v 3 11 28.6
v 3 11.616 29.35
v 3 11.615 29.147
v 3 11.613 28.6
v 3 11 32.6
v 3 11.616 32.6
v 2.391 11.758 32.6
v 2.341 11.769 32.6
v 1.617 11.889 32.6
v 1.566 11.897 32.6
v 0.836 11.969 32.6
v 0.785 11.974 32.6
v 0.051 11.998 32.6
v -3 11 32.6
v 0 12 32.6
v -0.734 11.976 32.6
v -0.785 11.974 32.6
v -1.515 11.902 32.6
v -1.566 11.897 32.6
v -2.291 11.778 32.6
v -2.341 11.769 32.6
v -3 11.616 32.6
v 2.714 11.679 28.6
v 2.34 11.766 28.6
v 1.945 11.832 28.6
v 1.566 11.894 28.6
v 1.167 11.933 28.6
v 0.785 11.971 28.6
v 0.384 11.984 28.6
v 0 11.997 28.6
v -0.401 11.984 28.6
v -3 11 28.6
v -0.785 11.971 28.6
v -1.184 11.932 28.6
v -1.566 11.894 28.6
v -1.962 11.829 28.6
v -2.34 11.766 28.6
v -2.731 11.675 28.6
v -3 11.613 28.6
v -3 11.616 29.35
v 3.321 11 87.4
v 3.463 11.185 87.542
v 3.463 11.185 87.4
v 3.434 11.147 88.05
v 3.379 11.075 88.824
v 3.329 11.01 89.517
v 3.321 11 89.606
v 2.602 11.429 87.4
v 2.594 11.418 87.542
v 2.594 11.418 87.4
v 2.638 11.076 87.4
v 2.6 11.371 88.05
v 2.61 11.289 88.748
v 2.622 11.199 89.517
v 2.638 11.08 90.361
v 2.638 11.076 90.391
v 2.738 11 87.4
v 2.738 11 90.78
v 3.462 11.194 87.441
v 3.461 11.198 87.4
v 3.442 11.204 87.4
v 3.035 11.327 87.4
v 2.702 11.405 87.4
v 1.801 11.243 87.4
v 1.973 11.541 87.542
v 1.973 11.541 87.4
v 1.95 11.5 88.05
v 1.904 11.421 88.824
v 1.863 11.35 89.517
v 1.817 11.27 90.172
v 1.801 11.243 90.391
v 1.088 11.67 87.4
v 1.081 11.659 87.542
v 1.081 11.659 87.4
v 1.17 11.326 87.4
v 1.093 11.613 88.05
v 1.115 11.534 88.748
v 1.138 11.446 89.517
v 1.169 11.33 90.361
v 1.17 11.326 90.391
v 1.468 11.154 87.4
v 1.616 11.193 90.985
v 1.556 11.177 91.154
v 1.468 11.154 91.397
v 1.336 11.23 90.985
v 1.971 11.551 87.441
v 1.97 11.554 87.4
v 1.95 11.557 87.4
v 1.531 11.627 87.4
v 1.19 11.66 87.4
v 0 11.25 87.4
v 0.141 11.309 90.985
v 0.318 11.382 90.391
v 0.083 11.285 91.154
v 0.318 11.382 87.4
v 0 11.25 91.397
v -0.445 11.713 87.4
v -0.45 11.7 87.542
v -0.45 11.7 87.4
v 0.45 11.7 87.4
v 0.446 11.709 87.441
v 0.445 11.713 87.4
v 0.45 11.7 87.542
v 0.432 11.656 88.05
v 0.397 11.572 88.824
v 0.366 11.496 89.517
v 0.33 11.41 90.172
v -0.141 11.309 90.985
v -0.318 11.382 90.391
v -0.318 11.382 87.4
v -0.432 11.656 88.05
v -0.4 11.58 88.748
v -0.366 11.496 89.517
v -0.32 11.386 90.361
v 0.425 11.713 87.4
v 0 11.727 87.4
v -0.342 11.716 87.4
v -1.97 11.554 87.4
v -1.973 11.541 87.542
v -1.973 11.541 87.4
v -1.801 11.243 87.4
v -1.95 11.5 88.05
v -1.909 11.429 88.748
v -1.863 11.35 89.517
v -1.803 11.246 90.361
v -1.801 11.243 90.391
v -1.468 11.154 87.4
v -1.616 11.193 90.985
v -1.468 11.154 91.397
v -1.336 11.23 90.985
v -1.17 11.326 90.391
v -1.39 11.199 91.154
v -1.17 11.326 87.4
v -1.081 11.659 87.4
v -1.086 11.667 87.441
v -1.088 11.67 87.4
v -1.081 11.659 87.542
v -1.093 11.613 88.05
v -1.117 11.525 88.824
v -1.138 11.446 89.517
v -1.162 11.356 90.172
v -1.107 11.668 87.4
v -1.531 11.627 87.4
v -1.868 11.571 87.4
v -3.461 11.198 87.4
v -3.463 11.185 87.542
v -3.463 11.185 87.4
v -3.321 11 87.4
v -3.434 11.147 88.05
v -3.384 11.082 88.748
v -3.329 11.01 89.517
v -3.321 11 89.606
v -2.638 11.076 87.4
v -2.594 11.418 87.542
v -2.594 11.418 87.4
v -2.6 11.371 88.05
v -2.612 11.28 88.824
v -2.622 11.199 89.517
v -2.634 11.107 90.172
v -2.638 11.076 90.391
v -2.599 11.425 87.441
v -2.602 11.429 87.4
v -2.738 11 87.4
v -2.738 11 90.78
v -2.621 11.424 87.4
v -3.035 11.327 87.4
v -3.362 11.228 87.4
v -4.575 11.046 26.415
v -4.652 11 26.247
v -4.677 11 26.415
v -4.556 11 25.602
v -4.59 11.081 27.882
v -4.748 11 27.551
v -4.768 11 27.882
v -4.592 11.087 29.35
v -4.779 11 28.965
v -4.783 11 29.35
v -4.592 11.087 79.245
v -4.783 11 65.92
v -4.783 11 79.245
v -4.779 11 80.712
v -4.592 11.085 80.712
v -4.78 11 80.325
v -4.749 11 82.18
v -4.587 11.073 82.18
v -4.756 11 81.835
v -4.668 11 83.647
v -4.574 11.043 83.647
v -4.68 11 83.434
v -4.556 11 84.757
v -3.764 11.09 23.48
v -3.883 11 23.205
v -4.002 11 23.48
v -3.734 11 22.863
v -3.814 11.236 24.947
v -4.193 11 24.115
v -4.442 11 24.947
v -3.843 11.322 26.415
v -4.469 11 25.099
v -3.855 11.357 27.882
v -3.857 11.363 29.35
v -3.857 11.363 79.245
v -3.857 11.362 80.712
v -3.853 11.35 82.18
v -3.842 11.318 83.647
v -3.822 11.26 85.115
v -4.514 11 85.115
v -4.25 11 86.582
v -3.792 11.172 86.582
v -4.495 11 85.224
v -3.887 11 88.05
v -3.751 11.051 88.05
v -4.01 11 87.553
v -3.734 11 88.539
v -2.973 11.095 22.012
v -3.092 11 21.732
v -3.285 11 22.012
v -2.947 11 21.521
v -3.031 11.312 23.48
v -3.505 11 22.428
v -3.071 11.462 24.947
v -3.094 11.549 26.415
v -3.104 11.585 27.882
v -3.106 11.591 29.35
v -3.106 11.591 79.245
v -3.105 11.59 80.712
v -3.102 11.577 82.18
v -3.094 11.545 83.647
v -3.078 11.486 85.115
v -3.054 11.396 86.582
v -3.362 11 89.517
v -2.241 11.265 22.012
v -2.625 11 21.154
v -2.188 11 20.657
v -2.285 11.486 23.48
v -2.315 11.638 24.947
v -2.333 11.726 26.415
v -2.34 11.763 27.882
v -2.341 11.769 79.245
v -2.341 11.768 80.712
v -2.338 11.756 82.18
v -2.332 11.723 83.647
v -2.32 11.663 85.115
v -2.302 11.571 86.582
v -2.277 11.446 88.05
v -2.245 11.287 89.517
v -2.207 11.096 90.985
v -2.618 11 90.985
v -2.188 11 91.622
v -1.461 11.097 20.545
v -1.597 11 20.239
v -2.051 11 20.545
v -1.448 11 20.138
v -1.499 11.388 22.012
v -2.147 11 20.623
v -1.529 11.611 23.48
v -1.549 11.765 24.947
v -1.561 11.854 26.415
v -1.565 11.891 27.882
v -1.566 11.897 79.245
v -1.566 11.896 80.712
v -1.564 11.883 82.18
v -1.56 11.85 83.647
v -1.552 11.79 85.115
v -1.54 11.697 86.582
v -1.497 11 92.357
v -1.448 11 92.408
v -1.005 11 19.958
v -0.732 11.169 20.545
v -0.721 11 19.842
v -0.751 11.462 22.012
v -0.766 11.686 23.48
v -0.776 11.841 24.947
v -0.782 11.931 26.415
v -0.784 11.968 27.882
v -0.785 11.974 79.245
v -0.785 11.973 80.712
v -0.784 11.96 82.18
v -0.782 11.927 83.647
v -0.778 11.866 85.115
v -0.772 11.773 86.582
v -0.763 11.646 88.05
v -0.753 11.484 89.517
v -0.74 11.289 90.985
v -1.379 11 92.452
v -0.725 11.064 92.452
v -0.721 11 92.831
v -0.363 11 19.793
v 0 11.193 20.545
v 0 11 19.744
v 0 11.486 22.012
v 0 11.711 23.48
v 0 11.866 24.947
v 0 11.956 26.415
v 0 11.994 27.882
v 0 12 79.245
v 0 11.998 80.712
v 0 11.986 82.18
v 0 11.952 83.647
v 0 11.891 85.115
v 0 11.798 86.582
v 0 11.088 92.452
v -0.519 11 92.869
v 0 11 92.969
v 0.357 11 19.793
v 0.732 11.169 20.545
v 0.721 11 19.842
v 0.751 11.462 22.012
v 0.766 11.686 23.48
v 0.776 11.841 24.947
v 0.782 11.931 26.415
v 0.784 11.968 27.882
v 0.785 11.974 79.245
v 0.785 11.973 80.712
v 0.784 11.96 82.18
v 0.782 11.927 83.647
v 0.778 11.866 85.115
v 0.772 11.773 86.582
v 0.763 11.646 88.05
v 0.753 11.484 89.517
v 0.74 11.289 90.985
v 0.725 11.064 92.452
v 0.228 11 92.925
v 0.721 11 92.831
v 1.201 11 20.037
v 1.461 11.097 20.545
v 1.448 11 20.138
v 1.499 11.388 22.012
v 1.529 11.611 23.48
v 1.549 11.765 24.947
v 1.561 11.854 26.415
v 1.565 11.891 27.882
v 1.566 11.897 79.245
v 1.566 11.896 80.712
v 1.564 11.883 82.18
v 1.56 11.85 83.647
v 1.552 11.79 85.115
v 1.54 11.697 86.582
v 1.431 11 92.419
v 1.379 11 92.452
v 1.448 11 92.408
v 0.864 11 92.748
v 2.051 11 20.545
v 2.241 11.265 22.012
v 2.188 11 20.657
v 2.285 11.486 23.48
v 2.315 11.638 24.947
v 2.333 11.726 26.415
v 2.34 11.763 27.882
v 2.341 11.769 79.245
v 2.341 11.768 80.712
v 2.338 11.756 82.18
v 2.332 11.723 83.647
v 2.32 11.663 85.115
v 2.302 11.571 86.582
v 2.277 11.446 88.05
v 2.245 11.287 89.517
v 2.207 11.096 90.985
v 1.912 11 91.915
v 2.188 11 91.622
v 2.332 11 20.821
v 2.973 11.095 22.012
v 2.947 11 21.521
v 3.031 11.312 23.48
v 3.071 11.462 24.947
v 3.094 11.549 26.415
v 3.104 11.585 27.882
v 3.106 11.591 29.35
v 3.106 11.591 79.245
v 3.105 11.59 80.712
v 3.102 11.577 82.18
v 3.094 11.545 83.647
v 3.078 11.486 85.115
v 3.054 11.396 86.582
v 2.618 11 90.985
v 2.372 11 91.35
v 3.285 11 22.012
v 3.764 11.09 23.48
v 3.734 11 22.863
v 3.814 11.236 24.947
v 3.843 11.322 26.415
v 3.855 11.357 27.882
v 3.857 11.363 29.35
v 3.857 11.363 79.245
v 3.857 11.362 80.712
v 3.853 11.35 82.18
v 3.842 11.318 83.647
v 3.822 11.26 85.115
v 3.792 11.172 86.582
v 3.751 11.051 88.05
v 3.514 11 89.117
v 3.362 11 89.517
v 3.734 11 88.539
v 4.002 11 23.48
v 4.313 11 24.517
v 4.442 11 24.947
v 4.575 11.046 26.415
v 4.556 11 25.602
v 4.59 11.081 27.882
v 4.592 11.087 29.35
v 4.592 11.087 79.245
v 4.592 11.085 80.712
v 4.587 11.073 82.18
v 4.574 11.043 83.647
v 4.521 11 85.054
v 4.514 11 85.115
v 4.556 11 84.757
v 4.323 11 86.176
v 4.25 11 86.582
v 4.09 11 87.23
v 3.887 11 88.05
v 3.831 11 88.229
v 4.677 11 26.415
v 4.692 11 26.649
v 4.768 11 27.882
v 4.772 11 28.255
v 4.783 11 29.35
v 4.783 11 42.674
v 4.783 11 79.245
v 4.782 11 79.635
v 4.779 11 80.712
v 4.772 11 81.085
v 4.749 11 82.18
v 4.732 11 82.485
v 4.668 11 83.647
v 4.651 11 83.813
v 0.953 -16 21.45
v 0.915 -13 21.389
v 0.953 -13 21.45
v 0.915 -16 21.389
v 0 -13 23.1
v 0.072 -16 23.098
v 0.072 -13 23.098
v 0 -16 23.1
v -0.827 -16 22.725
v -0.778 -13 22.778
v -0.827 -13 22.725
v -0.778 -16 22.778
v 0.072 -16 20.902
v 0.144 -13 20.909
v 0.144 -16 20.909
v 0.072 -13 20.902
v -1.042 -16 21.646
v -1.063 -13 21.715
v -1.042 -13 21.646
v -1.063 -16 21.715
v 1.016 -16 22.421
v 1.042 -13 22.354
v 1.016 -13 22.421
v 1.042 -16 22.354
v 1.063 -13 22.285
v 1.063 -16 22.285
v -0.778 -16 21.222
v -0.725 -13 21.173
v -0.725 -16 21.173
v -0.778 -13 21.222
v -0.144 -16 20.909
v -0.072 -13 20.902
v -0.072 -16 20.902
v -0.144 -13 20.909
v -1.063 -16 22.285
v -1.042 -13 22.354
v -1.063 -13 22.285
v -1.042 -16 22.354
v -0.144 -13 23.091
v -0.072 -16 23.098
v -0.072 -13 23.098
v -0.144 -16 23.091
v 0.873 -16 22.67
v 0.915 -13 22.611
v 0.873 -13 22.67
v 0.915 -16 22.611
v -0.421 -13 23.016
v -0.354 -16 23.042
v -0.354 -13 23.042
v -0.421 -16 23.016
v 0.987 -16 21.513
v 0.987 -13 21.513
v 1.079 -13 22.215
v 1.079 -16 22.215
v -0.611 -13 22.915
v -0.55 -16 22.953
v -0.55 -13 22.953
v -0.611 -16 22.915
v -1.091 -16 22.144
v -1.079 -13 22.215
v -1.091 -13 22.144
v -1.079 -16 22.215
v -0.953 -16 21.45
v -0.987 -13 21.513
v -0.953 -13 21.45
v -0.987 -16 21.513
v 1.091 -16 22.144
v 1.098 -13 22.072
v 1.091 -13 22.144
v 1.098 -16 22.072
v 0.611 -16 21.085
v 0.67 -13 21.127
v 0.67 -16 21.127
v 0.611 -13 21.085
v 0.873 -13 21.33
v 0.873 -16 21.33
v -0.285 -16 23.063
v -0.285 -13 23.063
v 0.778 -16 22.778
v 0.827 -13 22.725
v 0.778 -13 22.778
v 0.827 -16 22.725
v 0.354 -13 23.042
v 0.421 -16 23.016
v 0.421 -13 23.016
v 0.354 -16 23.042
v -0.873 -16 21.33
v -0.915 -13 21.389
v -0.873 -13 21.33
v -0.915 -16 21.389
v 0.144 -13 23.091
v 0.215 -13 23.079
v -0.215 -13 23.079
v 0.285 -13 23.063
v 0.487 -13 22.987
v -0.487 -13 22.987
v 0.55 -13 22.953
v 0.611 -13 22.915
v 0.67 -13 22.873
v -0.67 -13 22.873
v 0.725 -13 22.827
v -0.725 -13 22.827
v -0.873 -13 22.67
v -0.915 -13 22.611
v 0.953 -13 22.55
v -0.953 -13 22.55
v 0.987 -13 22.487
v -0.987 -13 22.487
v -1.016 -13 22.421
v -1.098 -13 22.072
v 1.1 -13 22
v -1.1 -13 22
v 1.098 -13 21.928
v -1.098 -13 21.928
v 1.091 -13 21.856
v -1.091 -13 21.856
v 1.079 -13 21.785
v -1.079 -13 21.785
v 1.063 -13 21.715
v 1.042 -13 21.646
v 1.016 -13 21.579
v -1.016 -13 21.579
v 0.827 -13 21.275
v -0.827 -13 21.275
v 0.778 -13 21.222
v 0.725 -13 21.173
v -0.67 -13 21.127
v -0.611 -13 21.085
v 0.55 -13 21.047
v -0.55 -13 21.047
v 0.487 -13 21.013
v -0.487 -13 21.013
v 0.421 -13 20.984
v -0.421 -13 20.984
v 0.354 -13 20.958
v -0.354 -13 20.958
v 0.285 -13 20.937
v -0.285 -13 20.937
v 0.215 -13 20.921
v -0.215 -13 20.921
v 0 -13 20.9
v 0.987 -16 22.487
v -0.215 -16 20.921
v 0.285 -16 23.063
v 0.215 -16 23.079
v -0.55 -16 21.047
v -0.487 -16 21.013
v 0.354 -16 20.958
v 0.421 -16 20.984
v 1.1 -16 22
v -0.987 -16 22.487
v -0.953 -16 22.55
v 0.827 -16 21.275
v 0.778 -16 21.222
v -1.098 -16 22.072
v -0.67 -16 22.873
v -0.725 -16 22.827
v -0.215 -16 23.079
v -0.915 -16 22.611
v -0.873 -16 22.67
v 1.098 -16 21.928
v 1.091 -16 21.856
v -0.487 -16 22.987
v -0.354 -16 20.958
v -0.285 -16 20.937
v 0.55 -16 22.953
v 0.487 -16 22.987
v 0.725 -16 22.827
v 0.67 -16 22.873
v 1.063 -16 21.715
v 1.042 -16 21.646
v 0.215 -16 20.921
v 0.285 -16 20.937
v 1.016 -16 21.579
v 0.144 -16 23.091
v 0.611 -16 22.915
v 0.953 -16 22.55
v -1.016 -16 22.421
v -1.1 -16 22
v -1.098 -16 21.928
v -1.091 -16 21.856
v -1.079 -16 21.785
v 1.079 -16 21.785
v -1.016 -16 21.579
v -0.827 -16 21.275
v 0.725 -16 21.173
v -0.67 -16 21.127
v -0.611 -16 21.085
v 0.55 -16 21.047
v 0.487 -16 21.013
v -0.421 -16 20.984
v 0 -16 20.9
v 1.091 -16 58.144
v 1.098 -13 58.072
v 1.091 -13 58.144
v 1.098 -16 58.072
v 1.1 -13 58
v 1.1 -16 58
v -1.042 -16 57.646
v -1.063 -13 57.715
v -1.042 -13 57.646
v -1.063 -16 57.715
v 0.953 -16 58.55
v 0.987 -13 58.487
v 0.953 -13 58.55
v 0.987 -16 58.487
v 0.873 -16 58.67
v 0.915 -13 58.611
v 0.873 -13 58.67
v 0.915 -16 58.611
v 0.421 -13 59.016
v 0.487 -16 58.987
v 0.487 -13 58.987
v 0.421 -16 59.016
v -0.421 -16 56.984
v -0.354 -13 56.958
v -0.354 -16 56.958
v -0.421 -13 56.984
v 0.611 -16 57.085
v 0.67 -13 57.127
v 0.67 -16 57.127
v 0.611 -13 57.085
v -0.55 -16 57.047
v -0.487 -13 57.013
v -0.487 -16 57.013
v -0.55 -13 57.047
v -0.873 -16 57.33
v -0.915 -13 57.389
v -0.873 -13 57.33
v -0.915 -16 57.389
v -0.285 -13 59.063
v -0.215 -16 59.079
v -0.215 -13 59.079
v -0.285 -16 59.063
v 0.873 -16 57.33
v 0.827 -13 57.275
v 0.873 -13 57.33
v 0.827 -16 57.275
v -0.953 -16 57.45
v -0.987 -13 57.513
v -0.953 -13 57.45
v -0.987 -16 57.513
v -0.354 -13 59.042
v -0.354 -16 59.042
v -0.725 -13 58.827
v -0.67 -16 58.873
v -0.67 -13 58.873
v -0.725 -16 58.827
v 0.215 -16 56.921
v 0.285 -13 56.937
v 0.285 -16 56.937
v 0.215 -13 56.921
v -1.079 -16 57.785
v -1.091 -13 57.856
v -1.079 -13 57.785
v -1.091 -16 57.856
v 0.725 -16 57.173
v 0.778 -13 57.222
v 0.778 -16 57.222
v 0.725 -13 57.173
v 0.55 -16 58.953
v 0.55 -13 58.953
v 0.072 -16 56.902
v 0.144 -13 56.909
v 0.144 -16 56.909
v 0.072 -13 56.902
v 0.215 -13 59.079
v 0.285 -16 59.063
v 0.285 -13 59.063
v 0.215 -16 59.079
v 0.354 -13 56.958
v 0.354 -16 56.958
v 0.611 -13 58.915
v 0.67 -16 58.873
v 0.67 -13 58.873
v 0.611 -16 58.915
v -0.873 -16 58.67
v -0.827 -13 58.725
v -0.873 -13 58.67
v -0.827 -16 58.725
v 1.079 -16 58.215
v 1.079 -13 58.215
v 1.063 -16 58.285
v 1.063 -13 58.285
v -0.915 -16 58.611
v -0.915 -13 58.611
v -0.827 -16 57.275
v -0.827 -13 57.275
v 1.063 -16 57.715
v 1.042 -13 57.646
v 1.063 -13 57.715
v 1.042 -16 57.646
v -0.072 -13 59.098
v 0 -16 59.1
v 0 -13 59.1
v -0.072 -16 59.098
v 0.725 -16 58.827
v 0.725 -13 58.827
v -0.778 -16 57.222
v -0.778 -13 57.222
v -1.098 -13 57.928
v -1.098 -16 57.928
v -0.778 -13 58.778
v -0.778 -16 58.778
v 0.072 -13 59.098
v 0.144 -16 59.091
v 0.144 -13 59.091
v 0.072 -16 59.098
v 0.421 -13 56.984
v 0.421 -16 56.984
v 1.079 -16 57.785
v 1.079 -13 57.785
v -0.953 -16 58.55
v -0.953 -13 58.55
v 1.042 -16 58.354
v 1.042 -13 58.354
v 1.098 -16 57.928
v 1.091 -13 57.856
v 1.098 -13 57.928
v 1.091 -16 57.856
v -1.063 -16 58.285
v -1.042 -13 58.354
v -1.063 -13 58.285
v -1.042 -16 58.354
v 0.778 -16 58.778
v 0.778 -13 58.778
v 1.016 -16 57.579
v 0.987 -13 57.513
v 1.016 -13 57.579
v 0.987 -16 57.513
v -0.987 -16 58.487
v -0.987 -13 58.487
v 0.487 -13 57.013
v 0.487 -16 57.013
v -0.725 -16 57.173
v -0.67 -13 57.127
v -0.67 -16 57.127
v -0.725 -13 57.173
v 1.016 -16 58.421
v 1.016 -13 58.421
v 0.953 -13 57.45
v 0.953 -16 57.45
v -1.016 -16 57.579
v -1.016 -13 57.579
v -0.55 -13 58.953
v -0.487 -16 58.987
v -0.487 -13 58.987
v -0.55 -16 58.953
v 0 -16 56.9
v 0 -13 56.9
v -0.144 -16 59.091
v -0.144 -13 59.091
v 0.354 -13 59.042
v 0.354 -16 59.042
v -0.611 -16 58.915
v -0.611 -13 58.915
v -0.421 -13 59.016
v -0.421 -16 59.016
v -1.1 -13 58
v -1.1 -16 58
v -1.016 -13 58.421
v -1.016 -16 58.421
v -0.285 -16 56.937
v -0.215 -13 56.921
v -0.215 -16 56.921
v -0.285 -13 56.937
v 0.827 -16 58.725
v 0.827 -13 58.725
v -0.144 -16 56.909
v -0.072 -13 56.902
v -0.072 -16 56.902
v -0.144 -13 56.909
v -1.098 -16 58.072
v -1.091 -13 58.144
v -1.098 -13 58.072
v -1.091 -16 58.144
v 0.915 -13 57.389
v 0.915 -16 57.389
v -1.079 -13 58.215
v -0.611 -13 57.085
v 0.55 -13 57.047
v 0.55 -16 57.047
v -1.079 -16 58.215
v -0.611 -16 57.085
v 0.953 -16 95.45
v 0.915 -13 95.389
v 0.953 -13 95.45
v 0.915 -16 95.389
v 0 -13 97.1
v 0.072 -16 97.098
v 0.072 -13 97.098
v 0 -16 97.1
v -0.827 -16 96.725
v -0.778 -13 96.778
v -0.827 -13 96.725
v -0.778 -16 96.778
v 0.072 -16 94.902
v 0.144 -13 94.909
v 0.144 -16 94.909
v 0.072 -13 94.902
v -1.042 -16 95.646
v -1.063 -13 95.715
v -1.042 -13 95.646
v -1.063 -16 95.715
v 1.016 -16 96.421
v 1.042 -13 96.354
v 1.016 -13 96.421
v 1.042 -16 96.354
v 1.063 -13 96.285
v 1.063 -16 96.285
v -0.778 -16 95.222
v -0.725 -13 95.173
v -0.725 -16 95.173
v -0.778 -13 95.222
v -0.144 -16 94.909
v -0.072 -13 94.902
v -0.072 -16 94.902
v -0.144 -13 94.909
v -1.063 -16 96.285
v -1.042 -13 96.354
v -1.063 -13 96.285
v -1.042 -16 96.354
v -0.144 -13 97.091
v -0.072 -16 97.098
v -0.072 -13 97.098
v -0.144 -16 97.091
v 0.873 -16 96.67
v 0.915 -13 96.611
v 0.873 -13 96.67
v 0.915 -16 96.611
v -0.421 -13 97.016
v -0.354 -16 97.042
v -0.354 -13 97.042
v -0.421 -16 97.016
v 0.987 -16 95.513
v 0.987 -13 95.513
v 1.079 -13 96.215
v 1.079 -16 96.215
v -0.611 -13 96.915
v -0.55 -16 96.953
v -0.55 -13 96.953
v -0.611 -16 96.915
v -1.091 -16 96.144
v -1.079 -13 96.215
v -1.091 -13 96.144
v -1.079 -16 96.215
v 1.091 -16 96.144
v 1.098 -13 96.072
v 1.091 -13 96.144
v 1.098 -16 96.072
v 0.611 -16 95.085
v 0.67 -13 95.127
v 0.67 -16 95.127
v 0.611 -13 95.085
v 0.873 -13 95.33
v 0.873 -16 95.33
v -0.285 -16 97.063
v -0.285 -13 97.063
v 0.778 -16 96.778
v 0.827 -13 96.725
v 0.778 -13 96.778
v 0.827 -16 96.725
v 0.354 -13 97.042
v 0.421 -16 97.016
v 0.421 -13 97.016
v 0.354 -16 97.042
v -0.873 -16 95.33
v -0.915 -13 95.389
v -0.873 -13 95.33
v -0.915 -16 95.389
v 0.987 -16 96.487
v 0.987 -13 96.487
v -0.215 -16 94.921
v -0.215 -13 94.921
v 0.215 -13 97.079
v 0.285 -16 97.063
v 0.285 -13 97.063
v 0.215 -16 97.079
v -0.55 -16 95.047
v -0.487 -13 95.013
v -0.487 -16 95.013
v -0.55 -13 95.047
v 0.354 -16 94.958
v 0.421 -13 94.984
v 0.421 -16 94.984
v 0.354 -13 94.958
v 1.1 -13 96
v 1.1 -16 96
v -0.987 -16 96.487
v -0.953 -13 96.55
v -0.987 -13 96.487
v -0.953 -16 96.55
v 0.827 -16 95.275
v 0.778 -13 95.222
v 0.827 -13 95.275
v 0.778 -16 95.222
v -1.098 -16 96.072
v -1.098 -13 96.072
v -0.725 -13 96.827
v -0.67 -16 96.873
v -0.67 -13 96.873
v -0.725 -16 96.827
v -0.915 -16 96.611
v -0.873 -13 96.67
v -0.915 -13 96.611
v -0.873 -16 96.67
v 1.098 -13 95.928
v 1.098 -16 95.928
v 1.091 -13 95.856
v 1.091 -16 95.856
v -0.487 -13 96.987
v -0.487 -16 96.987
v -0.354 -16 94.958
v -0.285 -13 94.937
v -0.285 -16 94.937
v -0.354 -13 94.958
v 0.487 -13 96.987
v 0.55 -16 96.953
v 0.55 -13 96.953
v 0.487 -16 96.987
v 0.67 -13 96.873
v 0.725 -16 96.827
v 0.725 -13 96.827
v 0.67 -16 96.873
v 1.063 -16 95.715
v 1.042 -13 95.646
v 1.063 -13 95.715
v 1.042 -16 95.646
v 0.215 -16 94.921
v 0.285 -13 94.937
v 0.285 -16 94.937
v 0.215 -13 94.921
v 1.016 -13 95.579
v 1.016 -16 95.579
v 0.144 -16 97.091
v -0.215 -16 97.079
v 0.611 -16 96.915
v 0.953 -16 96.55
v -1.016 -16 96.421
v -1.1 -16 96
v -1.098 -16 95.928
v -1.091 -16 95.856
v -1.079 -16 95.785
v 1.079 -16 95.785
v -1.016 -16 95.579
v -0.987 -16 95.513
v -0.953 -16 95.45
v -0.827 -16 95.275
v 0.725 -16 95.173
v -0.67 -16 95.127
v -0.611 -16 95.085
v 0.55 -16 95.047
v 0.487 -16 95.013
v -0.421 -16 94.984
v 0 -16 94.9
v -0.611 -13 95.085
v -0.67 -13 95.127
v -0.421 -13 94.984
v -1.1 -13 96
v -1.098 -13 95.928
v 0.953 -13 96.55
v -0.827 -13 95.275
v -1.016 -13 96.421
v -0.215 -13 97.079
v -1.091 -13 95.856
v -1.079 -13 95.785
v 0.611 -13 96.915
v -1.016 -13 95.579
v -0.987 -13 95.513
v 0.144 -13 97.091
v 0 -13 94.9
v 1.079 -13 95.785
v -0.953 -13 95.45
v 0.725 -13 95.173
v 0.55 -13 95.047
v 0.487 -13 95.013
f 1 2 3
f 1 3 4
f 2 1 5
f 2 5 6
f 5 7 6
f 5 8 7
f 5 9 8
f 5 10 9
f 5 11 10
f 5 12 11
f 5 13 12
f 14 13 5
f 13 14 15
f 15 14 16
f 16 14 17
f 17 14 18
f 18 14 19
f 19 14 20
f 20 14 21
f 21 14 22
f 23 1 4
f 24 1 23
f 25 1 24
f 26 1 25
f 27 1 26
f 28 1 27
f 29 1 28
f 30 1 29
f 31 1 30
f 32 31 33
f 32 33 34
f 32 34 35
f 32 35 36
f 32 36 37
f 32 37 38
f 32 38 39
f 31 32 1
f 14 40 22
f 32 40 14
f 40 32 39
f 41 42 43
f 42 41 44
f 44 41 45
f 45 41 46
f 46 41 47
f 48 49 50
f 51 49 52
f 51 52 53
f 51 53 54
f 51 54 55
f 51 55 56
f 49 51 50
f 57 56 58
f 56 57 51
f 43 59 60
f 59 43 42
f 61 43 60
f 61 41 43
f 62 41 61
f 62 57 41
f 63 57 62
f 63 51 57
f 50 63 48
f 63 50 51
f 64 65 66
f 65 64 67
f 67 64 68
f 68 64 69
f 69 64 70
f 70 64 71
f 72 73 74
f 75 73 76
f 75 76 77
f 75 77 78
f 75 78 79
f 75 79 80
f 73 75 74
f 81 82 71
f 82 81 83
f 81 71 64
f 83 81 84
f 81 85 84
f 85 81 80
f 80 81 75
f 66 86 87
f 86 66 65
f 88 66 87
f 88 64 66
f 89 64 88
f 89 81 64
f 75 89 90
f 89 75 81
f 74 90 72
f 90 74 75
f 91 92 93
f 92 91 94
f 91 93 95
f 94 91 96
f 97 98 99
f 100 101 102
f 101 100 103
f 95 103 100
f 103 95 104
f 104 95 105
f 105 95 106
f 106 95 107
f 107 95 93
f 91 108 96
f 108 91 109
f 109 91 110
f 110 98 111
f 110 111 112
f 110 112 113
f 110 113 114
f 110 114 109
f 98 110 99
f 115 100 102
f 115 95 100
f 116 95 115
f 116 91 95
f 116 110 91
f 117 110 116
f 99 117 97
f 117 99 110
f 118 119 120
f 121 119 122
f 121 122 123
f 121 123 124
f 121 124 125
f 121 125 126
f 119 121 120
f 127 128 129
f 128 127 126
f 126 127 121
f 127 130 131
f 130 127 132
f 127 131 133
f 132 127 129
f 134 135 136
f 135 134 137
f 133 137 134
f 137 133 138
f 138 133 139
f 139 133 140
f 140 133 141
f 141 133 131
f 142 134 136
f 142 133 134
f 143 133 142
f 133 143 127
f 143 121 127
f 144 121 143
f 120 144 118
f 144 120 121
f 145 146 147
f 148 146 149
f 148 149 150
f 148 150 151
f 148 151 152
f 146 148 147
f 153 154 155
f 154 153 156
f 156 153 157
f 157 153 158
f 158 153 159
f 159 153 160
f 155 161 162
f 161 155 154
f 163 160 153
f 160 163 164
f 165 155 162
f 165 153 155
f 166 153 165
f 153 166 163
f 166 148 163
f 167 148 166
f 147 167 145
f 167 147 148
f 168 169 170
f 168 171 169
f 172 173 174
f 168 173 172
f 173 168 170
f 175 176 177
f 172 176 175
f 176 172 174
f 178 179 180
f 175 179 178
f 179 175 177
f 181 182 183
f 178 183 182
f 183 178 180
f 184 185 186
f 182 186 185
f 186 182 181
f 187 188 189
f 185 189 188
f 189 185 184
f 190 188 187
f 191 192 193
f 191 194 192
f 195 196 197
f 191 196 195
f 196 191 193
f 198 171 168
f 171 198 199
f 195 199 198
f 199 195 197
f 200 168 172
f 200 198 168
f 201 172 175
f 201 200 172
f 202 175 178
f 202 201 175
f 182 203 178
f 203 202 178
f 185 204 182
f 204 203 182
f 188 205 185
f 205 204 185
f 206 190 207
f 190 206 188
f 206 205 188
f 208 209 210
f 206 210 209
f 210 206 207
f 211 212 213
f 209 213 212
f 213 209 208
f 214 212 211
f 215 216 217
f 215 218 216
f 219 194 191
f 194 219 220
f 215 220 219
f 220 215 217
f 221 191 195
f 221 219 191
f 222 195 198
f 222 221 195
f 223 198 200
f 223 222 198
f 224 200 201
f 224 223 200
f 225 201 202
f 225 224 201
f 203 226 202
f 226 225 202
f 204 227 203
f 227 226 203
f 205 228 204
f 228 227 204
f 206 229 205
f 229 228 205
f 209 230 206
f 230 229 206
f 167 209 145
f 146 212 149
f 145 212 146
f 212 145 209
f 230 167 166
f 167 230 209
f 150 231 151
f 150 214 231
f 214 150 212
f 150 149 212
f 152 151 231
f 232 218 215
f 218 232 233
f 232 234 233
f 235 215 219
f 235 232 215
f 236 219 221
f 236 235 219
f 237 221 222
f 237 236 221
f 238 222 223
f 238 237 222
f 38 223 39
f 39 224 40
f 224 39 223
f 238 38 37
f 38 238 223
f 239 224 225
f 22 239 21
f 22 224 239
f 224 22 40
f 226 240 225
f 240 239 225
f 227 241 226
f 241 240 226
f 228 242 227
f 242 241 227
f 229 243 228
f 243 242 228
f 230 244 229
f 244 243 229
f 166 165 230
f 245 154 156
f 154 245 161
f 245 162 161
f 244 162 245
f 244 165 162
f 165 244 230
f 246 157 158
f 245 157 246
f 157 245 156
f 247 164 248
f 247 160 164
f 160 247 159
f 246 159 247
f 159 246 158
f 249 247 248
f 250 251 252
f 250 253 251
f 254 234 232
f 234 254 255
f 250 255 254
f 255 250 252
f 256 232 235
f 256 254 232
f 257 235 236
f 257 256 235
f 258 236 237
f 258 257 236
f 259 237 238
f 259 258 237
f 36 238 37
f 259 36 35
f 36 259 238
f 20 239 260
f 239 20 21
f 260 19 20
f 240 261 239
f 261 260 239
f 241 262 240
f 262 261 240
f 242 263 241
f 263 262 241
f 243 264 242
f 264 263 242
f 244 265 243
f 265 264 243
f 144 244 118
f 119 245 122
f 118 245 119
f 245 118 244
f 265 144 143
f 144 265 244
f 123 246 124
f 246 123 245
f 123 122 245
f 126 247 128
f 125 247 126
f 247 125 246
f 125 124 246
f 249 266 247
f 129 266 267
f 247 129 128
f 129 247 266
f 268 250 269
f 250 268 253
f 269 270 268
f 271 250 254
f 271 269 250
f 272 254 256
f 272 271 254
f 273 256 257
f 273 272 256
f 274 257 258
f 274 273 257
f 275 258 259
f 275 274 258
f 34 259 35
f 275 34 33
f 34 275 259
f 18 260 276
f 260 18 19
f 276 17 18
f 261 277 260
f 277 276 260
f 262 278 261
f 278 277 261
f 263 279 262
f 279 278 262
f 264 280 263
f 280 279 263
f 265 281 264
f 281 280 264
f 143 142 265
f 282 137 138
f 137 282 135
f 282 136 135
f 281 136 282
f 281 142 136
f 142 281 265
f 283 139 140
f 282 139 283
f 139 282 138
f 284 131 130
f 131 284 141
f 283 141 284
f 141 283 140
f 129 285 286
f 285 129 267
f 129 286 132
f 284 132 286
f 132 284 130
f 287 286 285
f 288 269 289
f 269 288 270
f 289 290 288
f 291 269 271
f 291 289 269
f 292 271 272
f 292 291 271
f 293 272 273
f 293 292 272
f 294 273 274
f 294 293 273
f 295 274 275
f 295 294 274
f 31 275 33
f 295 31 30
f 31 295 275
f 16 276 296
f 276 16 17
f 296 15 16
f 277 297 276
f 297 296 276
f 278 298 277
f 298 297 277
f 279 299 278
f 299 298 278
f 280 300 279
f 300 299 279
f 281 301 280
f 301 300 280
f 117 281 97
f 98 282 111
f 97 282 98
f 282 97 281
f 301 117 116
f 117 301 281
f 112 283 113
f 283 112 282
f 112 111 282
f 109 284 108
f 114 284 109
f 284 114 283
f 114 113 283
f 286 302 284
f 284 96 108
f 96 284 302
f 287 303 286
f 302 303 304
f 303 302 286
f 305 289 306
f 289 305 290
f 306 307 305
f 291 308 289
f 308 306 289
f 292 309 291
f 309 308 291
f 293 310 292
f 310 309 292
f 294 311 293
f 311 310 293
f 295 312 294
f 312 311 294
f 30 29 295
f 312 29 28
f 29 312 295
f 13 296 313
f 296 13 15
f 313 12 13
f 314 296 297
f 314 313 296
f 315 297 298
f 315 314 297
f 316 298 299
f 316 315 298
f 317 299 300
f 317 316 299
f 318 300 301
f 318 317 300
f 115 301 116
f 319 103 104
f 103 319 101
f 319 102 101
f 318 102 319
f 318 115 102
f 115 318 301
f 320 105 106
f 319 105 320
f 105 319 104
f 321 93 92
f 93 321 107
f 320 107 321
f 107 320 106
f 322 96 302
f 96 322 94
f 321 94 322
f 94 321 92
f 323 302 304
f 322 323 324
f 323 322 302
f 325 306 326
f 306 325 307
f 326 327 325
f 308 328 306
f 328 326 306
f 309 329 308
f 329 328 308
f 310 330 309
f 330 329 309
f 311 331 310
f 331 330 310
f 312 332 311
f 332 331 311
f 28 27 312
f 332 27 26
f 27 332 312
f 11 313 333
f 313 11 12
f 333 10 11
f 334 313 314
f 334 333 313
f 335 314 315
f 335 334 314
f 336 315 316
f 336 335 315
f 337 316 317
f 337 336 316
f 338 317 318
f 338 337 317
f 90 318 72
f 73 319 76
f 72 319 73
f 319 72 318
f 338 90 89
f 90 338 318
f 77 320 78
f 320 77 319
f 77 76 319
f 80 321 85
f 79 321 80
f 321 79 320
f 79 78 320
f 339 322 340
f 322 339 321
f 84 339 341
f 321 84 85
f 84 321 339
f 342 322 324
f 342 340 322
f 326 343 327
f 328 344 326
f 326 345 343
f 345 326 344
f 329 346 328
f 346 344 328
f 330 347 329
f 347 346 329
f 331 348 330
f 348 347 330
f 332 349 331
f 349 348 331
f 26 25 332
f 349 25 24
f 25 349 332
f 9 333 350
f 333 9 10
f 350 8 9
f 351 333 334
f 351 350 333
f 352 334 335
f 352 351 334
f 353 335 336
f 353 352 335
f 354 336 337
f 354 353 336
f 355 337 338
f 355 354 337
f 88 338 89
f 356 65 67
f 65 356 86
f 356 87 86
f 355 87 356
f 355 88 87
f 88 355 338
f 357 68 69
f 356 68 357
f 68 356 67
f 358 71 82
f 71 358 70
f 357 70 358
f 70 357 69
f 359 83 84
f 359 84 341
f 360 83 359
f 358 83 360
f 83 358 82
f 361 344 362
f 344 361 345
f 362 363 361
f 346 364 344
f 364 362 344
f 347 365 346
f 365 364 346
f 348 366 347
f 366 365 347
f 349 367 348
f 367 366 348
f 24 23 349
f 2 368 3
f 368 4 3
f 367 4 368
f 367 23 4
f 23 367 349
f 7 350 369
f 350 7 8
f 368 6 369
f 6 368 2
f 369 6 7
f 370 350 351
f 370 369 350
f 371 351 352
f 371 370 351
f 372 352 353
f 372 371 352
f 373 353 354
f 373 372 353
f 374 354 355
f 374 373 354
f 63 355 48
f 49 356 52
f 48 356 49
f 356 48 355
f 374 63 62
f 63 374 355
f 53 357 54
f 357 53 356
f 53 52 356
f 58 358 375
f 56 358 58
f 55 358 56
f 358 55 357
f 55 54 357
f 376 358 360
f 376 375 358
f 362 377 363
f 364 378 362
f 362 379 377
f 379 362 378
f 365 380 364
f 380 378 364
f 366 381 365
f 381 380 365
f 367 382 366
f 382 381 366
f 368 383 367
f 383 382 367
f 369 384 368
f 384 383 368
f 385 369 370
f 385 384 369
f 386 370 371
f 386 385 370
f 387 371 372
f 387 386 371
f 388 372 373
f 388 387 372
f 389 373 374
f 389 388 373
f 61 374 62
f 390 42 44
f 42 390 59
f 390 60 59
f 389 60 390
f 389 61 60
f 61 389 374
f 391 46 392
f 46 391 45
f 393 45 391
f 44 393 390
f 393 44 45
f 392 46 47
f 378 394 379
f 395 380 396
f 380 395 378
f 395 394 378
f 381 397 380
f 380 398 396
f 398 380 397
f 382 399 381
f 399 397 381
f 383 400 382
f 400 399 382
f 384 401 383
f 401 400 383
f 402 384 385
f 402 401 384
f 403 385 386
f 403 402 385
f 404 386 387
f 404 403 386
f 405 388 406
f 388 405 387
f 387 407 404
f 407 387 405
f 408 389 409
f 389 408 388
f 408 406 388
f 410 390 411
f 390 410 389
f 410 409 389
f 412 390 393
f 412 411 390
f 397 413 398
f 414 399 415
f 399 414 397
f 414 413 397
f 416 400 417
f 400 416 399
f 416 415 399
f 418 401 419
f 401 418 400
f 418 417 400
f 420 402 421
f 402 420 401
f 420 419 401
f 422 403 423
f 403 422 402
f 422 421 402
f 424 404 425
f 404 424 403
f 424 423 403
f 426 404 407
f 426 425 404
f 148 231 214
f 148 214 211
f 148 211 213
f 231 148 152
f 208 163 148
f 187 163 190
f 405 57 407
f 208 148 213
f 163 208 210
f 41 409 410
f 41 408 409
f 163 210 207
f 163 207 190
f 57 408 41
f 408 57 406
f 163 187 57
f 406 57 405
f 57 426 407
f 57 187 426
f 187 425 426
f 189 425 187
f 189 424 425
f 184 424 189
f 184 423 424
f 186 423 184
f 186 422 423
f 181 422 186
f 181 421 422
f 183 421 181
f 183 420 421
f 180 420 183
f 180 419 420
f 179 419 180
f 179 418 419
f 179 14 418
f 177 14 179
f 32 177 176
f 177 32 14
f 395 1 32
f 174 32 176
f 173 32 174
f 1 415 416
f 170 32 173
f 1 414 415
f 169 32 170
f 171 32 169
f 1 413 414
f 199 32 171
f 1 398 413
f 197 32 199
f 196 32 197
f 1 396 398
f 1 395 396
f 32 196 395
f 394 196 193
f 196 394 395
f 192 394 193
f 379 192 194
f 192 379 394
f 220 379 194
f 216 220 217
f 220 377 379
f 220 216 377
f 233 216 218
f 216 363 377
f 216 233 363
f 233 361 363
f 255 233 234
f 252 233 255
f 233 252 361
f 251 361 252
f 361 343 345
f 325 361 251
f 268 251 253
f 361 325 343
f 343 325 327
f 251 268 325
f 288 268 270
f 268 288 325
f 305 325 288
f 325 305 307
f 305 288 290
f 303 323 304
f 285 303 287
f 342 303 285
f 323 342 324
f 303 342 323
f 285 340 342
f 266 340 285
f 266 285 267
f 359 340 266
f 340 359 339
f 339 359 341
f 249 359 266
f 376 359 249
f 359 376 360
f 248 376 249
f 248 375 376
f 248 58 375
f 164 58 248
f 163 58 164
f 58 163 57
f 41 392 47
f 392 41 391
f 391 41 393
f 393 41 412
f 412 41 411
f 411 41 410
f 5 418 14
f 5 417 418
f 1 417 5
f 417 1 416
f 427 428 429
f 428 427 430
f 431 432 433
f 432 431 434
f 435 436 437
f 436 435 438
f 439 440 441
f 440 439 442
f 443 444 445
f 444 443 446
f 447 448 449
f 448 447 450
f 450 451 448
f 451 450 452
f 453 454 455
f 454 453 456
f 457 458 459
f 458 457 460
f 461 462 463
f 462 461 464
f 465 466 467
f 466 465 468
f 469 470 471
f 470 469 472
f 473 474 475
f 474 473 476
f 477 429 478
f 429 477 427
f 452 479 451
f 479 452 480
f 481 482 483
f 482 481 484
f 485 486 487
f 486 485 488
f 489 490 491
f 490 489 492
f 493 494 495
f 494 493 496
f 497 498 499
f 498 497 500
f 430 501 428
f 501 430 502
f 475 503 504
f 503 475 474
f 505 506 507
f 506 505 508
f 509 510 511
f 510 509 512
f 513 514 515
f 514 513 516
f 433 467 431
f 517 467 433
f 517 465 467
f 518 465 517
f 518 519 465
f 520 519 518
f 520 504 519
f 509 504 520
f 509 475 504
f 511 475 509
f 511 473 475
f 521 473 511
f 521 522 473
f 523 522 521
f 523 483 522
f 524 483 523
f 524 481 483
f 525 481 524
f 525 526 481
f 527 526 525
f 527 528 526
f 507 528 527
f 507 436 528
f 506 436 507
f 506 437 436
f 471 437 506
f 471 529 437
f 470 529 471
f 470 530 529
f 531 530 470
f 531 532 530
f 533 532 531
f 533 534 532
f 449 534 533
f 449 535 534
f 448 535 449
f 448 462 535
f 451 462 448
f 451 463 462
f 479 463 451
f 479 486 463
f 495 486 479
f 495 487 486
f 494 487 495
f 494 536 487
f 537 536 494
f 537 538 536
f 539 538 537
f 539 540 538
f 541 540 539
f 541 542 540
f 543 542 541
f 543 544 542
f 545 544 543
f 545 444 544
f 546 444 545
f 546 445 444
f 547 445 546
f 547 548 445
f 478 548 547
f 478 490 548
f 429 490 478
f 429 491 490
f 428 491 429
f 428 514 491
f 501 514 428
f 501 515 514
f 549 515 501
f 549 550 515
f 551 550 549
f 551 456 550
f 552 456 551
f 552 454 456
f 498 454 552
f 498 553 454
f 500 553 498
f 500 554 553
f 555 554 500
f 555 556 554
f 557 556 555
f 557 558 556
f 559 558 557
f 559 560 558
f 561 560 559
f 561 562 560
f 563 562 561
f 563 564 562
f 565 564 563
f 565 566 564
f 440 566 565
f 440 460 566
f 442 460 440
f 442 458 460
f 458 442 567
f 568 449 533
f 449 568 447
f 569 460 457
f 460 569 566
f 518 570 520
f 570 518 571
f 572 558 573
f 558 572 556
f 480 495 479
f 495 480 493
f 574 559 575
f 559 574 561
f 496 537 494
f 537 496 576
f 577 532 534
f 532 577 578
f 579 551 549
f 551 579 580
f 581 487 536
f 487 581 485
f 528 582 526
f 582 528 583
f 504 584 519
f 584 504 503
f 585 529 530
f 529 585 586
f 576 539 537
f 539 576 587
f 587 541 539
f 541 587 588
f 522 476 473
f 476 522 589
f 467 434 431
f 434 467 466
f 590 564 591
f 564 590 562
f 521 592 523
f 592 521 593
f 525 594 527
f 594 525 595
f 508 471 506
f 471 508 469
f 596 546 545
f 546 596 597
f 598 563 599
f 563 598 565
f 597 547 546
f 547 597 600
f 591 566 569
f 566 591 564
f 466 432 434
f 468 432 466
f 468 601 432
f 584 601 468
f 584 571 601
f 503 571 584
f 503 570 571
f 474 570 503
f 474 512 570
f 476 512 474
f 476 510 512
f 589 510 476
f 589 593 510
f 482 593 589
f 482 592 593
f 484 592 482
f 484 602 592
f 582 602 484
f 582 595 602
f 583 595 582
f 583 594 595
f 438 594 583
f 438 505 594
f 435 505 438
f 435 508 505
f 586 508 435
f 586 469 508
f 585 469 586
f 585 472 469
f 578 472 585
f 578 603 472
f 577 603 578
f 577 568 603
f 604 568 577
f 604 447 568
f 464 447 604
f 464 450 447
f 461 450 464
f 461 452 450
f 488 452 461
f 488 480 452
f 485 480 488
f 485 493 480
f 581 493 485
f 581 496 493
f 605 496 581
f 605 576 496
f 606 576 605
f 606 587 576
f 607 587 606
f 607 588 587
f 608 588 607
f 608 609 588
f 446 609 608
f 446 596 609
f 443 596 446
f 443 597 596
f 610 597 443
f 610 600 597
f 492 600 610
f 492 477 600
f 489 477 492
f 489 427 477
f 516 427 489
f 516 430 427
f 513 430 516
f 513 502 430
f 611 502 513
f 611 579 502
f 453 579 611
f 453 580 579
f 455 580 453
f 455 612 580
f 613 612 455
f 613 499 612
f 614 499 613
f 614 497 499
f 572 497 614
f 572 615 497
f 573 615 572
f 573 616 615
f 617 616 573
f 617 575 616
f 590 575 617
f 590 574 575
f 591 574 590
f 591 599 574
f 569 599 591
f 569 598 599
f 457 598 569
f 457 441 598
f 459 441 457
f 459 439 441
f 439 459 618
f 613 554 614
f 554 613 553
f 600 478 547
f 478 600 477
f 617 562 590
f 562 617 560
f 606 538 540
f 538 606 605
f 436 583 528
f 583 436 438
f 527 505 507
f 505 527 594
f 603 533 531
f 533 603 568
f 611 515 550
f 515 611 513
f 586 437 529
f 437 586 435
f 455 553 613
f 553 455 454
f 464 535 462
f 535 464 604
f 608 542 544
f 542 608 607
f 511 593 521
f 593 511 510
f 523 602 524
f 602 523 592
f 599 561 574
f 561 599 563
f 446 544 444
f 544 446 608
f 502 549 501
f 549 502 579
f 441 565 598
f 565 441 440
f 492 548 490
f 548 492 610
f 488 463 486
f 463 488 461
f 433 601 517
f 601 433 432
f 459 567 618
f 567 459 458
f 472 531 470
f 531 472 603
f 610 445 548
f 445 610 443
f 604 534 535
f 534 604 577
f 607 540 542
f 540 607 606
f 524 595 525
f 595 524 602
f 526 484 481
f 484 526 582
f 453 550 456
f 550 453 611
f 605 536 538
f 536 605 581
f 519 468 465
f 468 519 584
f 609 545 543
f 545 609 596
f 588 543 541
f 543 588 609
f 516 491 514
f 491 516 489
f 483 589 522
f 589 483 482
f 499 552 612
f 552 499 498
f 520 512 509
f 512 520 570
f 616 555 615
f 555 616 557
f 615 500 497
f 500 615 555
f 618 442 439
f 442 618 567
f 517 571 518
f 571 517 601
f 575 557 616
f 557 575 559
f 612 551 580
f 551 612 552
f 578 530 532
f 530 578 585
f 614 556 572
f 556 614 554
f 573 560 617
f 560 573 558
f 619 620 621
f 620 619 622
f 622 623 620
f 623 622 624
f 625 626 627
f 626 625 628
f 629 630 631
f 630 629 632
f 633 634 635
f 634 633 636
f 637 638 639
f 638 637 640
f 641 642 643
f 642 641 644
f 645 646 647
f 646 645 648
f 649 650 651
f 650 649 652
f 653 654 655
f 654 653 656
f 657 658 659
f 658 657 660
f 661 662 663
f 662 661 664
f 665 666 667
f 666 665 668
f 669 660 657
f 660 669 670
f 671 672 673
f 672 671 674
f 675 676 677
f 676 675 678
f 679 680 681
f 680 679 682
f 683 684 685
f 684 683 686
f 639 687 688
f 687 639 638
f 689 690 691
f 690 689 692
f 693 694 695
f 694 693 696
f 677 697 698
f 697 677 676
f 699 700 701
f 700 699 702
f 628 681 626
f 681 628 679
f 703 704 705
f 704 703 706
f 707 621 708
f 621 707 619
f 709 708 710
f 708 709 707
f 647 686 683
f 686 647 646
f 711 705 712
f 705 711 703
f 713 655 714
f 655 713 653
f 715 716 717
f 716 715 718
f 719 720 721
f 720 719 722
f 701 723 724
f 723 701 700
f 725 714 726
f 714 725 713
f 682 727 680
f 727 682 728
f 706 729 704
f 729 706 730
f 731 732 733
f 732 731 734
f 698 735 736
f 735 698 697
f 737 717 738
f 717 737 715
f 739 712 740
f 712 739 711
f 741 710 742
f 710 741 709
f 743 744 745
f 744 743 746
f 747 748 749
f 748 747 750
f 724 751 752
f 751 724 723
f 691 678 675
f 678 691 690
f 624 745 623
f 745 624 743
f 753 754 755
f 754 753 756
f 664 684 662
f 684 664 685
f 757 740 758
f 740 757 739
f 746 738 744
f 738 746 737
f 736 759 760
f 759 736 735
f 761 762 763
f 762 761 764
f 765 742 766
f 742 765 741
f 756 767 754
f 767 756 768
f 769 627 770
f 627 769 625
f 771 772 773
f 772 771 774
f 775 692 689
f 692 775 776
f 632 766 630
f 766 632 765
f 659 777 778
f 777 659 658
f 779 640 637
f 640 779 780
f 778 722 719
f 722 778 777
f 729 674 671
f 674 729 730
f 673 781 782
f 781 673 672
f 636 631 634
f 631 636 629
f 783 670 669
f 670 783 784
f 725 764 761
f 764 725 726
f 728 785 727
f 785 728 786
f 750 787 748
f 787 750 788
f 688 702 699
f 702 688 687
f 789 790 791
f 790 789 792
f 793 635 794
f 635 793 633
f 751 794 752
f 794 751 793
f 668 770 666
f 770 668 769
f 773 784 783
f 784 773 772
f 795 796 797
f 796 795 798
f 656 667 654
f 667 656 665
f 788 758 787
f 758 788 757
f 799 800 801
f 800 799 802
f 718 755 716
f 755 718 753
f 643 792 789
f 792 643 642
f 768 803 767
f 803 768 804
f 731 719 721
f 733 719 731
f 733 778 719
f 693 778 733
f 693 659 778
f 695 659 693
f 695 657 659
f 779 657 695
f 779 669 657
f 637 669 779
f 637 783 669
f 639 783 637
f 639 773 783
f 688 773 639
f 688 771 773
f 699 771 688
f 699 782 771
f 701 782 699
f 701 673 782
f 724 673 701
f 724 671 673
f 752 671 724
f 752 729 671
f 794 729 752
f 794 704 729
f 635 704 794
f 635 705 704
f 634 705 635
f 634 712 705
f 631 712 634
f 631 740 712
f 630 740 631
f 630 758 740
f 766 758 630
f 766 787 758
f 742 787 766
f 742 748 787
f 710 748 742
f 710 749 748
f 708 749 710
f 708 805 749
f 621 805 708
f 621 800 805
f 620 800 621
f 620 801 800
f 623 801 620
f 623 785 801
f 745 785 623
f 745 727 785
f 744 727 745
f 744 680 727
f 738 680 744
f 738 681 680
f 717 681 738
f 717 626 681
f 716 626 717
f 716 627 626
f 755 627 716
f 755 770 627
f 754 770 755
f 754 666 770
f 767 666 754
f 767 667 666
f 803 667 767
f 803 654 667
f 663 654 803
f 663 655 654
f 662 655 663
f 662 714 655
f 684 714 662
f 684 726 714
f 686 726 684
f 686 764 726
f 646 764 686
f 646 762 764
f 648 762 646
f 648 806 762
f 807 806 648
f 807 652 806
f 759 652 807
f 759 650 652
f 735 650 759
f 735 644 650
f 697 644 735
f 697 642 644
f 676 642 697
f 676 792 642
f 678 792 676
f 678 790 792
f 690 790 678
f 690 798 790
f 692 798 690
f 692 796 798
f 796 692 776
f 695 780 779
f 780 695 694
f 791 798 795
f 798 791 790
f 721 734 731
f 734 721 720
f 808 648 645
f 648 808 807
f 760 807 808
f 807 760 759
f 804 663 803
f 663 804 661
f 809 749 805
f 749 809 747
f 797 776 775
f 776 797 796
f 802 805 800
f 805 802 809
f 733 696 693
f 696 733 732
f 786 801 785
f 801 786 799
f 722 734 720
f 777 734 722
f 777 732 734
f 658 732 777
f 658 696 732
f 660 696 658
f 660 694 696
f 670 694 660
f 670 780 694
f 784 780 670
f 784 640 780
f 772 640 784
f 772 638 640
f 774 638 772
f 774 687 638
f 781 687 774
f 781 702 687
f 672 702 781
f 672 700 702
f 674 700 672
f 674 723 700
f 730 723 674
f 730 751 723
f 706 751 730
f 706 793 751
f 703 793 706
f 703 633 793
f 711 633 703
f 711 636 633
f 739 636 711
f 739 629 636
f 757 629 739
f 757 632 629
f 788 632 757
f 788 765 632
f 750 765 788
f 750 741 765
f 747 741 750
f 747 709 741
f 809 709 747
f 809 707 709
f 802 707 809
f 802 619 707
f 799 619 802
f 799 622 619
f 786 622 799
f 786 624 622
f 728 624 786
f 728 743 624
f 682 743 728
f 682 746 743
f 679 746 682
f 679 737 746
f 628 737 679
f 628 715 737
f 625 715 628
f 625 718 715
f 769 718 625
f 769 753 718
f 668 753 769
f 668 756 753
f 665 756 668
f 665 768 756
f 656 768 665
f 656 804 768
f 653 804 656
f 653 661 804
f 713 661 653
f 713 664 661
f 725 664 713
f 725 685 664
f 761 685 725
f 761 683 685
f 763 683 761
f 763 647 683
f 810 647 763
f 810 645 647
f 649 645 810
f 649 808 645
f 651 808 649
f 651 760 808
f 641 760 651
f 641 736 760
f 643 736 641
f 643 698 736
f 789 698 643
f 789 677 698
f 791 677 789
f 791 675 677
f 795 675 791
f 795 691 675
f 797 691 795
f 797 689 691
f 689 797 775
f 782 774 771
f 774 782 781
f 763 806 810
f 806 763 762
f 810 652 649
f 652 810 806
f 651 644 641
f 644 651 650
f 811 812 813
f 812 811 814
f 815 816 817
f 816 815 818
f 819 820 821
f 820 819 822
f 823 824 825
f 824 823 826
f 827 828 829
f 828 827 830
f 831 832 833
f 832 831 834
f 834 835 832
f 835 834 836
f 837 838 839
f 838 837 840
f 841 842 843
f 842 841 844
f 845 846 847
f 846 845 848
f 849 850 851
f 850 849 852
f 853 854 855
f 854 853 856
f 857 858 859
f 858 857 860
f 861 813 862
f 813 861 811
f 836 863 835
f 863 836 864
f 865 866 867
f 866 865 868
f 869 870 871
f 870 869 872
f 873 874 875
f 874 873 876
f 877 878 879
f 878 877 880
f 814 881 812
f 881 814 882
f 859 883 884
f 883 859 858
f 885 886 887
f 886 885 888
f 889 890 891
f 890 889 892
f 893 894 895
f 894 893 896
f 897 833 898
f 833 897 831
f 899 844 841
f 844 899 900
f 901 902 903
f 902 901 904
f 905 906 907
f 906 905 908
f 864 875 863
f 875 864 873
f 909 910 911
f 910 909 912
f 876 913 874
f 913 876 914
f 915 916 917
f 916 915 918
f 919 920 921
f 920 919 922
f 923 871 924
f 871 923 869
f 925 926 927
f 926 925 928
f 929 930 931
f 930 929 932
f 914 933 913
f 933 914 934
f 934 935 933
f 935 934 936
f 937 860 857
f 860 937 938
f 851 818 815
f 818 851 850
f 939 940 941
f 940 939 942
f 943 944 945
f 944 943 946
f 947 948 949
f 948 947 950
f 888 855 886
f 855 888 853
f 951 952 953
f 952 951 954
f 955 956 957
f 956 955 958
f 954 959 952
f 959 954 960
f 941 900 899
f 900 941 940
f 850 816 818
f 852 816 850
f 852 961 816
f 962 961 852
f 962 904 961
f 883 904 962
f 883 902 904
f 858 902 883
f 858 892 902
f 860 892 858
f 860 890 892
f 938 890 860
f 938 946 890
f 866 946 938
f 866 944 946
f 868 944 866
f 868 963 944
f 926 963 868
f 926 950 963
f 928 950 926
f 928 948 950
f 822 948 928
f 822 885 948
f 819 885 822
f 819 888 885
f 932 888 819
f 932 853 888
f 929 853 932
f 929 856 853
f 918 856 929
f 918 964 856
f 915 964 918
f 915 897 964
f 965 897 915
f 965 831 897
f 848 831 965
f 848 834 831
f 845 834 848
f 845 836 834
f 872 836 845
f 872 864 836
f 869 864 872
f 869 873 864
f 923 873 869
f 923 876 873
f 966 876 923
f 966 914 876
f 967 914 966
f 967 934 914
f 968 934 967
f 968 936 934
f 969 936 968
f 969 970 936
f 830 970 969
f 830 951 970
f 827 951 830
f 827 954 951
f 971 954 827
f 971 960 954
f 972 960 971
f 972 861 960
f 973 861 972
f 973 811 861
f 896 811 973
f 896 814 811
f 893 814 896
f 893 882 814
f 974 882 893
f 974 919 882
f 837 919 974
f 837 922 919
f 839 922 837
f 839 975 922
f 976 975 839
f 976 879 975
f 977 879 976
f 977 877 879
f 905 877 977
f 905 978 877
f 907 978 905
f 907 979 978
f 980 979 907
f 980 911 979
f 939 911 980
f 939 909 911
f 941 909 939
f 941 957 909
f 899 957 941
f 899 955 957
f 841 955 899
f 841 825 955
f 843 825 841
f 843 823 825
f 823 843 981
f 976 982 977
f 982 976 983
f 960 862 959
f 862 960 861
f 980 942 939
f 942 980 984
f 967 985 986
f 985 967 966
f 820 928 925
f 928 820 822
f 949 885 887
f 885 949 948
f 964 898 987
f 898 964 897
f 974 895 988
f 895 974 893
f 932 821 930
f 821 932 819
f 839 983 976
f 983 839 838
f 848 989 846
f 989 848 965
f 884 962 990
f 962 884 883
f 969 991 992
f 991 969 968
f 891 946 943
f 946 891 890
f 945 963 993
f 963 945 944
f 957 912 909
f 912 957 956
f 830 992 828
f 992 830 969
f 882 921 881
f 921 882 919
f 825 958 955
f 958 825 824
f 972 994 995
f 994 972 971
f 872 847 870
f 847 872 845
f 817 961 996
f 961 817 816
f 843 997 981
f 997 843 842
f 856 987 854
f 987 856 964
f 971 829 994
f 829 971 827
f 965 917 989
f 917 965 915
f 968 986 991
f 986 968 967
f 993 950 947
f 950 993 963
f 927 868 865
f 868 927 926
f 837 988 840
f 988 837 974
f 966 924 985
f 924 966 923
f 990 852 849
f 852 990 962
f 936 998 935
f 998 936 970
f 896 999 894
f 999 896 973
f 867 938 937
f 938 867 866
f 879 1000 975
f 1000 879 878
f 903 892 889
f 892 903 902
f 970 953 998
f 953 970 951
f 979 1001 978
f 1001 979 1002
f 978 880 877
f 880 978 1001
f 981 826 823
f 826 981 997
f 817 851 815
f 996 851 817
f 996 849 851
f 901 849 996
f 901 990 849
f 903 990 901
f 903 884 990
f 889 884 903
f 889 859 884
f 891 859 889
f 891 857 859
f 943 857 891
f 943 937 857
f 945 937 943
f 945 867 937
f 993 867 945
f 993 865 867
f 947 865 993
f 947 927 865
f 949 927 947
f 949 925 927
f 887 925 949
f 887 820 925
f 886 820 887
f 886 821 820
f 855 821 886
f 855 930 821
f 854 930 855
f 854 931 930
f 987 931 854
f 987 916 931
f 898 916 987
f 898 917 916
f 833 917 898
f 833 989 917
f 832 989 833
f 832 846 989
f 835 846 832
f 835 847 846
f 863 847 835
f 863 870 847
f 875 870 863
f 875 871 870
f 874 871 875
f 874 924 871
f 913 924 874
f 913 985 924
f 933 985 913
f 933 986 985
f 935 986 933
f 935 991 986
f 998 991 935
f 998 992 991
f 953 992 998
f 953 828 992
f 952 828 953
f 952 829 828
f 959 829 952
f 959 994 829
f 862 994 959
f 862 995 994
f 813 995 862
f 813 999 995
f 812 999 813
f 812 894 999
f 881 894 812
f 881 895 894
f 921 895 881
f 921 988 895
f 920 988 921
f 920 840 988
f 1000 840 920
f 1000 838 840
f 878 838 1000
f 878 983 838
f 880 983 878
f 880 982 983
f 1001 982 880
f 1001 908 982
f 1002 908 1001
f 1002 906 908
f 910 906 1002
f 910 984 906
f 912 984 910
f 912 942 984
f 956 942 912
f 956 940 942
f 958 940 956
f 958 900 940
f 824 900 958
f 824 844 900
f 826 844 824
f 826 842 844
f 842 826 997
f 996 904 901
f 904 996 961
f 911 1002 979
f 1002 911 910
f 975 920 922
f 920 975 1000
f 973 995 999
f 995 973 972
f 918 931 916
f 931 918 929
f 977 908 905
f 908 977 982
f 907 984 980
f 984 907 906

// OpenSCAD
// file: params.scad
// ===========================================================================
// CueCam - shared parameters
// Every printed part in this folder is driven from here. Change a number,
// re-export, reprint. Units: mm.
// ===========================================================================

/* [Cue geometry] */
CUE_LEN        = 1473.2;   // 58 in
JOINT1_X       = 482.6;    // 19 in - the "one third from the tip" station
SHAFT_DIA_AT_J1= 14.2;     // cue diameter where the collar starts

/* [Camera collar] -------------------------------------------------------- */
// POD_OD is THE parameter. 24 suits a 16 mm-wide custom PCB; use 29 for a
// de-cased RunCam Thumb Pro. Anything over 30 is unplayable - see docs.
POD_OD         = 24.0;
COLLAR_LEN     = 117.4;
COLLAR_WALL    = 2.0;
BAY_LEN        = 70.0;     // cartridge bay
BAY_DIA        = 19.2;     // bay bore
LEAD_IN        = 29.4;     // front blend length
LEAD_OUT       = 38.0;     // rear blend length

/* [Bayonet] -------------------------------------------------------------- */
BAY_LUGS       = 2;        // lugs, equally spaced
LUG_W          = 4.0;      // circumferential width
LUG_H          = 1.8;      // radial height
LUG_T          = 3.0;      // axial thickness
BAYONET_ANGLE  = 28;       // degrees of twist to lock
DETENT_R       = 0.55;     // detent bump radius
EJECT_TRAVEL   = 9.0;      // how far the spring pushes the cartridge out

/* [Cartridge] ------------------------------------------------------------ */
CART_OD        = 18.6;     // slides in BAY_DIA with the boot around it
CART_WALL      = 1.2;
PCB_W          = 16.0;
PCB_T          = 1.6;
PCB_L          = 58.0;
CELL_W         = 20.0;     // LiPo 402040
CELL_T         = 4.0;
CELL_L         = 40.0;
SD_W           = 11.0;
SD_T           = 1.0;

/* [Optics] --------------------------------------------------------------- */
LENS_R         = 11.0;     // lens height above the cue axis
LENS_BORE      = 8.0;      // M12 lens barrel clearance
WINDOW_W       = 6.0;
WINDOW_H       = 4.0;
WINDOW_T       = 0.8;
// Max nose-down tilt before the cue's own shaft blocks the axis is 0.67 deg
// (tools/optics.py). So: zero. The lens looks straight down the cue.
LENS_TILT      = 0.0;

/* [Butt] ----------------------------------------------------------------- */
BUTT_OD        = 29.5;
BUTT_WALL      = 1.4;
BOLT_BORE_DIA  = 8.0;      // 5/16-14 clearance
BOLT_BORE_LEN  = 190.0;    // long on purpose: halves the balance swing
CAP_LEN        = 26.0;
BUMPER_THREAD  = 12.0;     // M12x1, LEFT hand

/* [Grip] ----------------------------------------------------------------- */
GRIP_LEN       = 260.0;
GRIP_WALL      = 2.6;
GRIP_SPLIT     = 1.2;      // split width so it springs over the butt
INDEX_RIB_W    = 2.0;      // tells your hand where the lens is

/* [Tip] ------------------------------------------------------------------ */
TIP_DIA        = 9.5;
FERRULE_LEN    = 13.0;
FERRULE_BORE   = 6.3;
STUD           = "4-40";   // #4-40 UNC, 2.845 mm major

/* [Print] ---------------------------------------------------------------- */
FIT            = 0.20;     // clearance on sliding fits, PA6-CF on a P1S
PRESS          = 0.05;     // interference on bonded fits
$fn            = 96;
// file: lib.scad
// Small helpers shared by the CueCam parts.
include <params.scad>;

// A solid of revolution from a list of [x, radius] points.
module revolve(profile, fn = $fn) {
    rotate_extrude($fn = fn)
        polygon(concat([[0, profile[0][0]]],
                       [for (p = profile) [p[1], p[0]]],
                       [[0, profile[len(profile) - 1][0]]]));
}

// Smootherstep, the same blend the drawings use, so printed parts and
// drawings agree on the collar silhouette.
function blend(t) = let (u = max(0, min(1, t))) u*u*u*(u*(u*6 - 15) + 10);

function collar_r(x) =
      x <= LEAD_IN
    ? (SHAFT_DIA_AT_J1 + (POD_OD - SHAFT_DIA_AT_J1) * blend(x / LEAD_IN)) / 2
    : x <= COLLAR_LEN - LEAD_OUT
    ? POD_OD / 2
    : (POD_OD + (15.9 - POD_OD)
        * blend((x - (COLLAR_LEN - LEAD_OUT)) / LEAD_OUT)) / 2;

function collar_profile(n = 80) =
    [for (i = [0 : n]) let (x = COLLAR_LEN * i / n) [x, collar_r(x)]];

// A bayonet track cut: axial entry, then a circumferential run to a detent.
module bayonet_track(r, angle = BAYONET_ANGLE, w = LUG_W + 2*FIT,
                     t = LUG_T + 2*FIT, depth = LUG_H + FIT) {
    // axial entry slot
    translate([0, 0, -0.1]) rotate([0, 0, -w/2 / (PI*r) * 180])
        rotate_extrude(angle = w / (PI * r) * 180, $fn = 128)
            translate([r - depth, 0]) square([depth + 1, t + 2]);
    // circumferential run
    translate([0, 0, t - 0.1])
        rotate_extrude(angle = angle, $fn = 128)
            translate([r - depth, 0]) square([depth + 1, w]);
}

module knurl(r, h, n = 36, d = 0.6) {
    for (i = [0 : n - 1]) rotate([0, 0, i * 360 / n])
        translate([r, 0, 0]) cylinder(h = h, d = d, $fn = 8);
}
// main file
// ===========================================================================
// Camera collar barrel - the part that makes this cue a camera cue.
// Prints in two halves split on the parting line; bond with 3M DP420 or
// Loctite EA 9460, then wrap one layer of 3k carbon sleeve and wet it out.
// The bond line is NOT structural on its own.
// ===========================================================================
include <lib.scad>;

HALF = true;        // false = whole part, for visualisation

module collar_solid() {
    revolve(collar_profile());
}

module bores() {
    // through bore for the cue's internal ballast rod / wiring route
    translate([0, 0, -1]) cylinder(h = COLLAR_LEN + 2, d = 9.6);
    // joint 1 female socket pocket (the 6061 insert is bonded in)
    translate([0, 0, -0.1]) cylinder(h = 19, d = 18.8 + PRESS);
    // cartridge bay
    translate([0, 0, 17.4]) cylinder(h = BAY_LEN + 6, d = BAY_DIA + FIT);
    // lens window aperture, looking forward, axis PARALLEL to the cue
    translate([0, LENS_R - 4, 30.6]) rotate([90, 0, 0])
        cylinder(h = 8, d = LENS_BORE);
    // window seat, 0.3 deep rebate so the sapphire finishes flush
    translate([-WINDOW_W/2, POD_OD/2 - WINDOW_T - 0.3, 30.6 - WINDOW_H/2])
        cube([WINDOW_W, WINDOW_T + 0.4, WINDOW_H]);
    // vent
    translate([0, -POD_OD/2 - 1, 92]) rotate([-90, 0, 0]) cylinder(h = 6, d = 0.8);
}

module lugs_and_track() {
    r = BAY_DIA / 2 + FIT;
    for (i = [0 : BAY_LUGS - 1]) rotate([0, 0, i * 360 / BAY_LUGS])
        translate([0, 0, 17.4 + BAY_LEN - LUG_T - 2]) bayonet_track(r);
}

module collar() {
    difference() {
        collar_solid();
        bores();
        lugs_and_track();
        // knurl relief on the tail so the bayonet ring has something to grip
        translate([0, 0, COLLAR_LEN - 30]) knurl(POD_OD/2 - 0.3, 14, 48, 0.9);
        if (HALF)
            translate([-POD_OD, -POD_OD/2 - 1, -1])
                cube([POD_OD * 2, POD_OD, COLLAR_LEN + 2]);
    }
    // alignment pins on the parting face
    if (HALF) for (z = [22, 58, 96])
        translate([0, -POD_OD/2 - 1, z]) rotate([90, 0, 0])
            cylinder(h = 3, d = 2.4 - FIT);
}

collar();
